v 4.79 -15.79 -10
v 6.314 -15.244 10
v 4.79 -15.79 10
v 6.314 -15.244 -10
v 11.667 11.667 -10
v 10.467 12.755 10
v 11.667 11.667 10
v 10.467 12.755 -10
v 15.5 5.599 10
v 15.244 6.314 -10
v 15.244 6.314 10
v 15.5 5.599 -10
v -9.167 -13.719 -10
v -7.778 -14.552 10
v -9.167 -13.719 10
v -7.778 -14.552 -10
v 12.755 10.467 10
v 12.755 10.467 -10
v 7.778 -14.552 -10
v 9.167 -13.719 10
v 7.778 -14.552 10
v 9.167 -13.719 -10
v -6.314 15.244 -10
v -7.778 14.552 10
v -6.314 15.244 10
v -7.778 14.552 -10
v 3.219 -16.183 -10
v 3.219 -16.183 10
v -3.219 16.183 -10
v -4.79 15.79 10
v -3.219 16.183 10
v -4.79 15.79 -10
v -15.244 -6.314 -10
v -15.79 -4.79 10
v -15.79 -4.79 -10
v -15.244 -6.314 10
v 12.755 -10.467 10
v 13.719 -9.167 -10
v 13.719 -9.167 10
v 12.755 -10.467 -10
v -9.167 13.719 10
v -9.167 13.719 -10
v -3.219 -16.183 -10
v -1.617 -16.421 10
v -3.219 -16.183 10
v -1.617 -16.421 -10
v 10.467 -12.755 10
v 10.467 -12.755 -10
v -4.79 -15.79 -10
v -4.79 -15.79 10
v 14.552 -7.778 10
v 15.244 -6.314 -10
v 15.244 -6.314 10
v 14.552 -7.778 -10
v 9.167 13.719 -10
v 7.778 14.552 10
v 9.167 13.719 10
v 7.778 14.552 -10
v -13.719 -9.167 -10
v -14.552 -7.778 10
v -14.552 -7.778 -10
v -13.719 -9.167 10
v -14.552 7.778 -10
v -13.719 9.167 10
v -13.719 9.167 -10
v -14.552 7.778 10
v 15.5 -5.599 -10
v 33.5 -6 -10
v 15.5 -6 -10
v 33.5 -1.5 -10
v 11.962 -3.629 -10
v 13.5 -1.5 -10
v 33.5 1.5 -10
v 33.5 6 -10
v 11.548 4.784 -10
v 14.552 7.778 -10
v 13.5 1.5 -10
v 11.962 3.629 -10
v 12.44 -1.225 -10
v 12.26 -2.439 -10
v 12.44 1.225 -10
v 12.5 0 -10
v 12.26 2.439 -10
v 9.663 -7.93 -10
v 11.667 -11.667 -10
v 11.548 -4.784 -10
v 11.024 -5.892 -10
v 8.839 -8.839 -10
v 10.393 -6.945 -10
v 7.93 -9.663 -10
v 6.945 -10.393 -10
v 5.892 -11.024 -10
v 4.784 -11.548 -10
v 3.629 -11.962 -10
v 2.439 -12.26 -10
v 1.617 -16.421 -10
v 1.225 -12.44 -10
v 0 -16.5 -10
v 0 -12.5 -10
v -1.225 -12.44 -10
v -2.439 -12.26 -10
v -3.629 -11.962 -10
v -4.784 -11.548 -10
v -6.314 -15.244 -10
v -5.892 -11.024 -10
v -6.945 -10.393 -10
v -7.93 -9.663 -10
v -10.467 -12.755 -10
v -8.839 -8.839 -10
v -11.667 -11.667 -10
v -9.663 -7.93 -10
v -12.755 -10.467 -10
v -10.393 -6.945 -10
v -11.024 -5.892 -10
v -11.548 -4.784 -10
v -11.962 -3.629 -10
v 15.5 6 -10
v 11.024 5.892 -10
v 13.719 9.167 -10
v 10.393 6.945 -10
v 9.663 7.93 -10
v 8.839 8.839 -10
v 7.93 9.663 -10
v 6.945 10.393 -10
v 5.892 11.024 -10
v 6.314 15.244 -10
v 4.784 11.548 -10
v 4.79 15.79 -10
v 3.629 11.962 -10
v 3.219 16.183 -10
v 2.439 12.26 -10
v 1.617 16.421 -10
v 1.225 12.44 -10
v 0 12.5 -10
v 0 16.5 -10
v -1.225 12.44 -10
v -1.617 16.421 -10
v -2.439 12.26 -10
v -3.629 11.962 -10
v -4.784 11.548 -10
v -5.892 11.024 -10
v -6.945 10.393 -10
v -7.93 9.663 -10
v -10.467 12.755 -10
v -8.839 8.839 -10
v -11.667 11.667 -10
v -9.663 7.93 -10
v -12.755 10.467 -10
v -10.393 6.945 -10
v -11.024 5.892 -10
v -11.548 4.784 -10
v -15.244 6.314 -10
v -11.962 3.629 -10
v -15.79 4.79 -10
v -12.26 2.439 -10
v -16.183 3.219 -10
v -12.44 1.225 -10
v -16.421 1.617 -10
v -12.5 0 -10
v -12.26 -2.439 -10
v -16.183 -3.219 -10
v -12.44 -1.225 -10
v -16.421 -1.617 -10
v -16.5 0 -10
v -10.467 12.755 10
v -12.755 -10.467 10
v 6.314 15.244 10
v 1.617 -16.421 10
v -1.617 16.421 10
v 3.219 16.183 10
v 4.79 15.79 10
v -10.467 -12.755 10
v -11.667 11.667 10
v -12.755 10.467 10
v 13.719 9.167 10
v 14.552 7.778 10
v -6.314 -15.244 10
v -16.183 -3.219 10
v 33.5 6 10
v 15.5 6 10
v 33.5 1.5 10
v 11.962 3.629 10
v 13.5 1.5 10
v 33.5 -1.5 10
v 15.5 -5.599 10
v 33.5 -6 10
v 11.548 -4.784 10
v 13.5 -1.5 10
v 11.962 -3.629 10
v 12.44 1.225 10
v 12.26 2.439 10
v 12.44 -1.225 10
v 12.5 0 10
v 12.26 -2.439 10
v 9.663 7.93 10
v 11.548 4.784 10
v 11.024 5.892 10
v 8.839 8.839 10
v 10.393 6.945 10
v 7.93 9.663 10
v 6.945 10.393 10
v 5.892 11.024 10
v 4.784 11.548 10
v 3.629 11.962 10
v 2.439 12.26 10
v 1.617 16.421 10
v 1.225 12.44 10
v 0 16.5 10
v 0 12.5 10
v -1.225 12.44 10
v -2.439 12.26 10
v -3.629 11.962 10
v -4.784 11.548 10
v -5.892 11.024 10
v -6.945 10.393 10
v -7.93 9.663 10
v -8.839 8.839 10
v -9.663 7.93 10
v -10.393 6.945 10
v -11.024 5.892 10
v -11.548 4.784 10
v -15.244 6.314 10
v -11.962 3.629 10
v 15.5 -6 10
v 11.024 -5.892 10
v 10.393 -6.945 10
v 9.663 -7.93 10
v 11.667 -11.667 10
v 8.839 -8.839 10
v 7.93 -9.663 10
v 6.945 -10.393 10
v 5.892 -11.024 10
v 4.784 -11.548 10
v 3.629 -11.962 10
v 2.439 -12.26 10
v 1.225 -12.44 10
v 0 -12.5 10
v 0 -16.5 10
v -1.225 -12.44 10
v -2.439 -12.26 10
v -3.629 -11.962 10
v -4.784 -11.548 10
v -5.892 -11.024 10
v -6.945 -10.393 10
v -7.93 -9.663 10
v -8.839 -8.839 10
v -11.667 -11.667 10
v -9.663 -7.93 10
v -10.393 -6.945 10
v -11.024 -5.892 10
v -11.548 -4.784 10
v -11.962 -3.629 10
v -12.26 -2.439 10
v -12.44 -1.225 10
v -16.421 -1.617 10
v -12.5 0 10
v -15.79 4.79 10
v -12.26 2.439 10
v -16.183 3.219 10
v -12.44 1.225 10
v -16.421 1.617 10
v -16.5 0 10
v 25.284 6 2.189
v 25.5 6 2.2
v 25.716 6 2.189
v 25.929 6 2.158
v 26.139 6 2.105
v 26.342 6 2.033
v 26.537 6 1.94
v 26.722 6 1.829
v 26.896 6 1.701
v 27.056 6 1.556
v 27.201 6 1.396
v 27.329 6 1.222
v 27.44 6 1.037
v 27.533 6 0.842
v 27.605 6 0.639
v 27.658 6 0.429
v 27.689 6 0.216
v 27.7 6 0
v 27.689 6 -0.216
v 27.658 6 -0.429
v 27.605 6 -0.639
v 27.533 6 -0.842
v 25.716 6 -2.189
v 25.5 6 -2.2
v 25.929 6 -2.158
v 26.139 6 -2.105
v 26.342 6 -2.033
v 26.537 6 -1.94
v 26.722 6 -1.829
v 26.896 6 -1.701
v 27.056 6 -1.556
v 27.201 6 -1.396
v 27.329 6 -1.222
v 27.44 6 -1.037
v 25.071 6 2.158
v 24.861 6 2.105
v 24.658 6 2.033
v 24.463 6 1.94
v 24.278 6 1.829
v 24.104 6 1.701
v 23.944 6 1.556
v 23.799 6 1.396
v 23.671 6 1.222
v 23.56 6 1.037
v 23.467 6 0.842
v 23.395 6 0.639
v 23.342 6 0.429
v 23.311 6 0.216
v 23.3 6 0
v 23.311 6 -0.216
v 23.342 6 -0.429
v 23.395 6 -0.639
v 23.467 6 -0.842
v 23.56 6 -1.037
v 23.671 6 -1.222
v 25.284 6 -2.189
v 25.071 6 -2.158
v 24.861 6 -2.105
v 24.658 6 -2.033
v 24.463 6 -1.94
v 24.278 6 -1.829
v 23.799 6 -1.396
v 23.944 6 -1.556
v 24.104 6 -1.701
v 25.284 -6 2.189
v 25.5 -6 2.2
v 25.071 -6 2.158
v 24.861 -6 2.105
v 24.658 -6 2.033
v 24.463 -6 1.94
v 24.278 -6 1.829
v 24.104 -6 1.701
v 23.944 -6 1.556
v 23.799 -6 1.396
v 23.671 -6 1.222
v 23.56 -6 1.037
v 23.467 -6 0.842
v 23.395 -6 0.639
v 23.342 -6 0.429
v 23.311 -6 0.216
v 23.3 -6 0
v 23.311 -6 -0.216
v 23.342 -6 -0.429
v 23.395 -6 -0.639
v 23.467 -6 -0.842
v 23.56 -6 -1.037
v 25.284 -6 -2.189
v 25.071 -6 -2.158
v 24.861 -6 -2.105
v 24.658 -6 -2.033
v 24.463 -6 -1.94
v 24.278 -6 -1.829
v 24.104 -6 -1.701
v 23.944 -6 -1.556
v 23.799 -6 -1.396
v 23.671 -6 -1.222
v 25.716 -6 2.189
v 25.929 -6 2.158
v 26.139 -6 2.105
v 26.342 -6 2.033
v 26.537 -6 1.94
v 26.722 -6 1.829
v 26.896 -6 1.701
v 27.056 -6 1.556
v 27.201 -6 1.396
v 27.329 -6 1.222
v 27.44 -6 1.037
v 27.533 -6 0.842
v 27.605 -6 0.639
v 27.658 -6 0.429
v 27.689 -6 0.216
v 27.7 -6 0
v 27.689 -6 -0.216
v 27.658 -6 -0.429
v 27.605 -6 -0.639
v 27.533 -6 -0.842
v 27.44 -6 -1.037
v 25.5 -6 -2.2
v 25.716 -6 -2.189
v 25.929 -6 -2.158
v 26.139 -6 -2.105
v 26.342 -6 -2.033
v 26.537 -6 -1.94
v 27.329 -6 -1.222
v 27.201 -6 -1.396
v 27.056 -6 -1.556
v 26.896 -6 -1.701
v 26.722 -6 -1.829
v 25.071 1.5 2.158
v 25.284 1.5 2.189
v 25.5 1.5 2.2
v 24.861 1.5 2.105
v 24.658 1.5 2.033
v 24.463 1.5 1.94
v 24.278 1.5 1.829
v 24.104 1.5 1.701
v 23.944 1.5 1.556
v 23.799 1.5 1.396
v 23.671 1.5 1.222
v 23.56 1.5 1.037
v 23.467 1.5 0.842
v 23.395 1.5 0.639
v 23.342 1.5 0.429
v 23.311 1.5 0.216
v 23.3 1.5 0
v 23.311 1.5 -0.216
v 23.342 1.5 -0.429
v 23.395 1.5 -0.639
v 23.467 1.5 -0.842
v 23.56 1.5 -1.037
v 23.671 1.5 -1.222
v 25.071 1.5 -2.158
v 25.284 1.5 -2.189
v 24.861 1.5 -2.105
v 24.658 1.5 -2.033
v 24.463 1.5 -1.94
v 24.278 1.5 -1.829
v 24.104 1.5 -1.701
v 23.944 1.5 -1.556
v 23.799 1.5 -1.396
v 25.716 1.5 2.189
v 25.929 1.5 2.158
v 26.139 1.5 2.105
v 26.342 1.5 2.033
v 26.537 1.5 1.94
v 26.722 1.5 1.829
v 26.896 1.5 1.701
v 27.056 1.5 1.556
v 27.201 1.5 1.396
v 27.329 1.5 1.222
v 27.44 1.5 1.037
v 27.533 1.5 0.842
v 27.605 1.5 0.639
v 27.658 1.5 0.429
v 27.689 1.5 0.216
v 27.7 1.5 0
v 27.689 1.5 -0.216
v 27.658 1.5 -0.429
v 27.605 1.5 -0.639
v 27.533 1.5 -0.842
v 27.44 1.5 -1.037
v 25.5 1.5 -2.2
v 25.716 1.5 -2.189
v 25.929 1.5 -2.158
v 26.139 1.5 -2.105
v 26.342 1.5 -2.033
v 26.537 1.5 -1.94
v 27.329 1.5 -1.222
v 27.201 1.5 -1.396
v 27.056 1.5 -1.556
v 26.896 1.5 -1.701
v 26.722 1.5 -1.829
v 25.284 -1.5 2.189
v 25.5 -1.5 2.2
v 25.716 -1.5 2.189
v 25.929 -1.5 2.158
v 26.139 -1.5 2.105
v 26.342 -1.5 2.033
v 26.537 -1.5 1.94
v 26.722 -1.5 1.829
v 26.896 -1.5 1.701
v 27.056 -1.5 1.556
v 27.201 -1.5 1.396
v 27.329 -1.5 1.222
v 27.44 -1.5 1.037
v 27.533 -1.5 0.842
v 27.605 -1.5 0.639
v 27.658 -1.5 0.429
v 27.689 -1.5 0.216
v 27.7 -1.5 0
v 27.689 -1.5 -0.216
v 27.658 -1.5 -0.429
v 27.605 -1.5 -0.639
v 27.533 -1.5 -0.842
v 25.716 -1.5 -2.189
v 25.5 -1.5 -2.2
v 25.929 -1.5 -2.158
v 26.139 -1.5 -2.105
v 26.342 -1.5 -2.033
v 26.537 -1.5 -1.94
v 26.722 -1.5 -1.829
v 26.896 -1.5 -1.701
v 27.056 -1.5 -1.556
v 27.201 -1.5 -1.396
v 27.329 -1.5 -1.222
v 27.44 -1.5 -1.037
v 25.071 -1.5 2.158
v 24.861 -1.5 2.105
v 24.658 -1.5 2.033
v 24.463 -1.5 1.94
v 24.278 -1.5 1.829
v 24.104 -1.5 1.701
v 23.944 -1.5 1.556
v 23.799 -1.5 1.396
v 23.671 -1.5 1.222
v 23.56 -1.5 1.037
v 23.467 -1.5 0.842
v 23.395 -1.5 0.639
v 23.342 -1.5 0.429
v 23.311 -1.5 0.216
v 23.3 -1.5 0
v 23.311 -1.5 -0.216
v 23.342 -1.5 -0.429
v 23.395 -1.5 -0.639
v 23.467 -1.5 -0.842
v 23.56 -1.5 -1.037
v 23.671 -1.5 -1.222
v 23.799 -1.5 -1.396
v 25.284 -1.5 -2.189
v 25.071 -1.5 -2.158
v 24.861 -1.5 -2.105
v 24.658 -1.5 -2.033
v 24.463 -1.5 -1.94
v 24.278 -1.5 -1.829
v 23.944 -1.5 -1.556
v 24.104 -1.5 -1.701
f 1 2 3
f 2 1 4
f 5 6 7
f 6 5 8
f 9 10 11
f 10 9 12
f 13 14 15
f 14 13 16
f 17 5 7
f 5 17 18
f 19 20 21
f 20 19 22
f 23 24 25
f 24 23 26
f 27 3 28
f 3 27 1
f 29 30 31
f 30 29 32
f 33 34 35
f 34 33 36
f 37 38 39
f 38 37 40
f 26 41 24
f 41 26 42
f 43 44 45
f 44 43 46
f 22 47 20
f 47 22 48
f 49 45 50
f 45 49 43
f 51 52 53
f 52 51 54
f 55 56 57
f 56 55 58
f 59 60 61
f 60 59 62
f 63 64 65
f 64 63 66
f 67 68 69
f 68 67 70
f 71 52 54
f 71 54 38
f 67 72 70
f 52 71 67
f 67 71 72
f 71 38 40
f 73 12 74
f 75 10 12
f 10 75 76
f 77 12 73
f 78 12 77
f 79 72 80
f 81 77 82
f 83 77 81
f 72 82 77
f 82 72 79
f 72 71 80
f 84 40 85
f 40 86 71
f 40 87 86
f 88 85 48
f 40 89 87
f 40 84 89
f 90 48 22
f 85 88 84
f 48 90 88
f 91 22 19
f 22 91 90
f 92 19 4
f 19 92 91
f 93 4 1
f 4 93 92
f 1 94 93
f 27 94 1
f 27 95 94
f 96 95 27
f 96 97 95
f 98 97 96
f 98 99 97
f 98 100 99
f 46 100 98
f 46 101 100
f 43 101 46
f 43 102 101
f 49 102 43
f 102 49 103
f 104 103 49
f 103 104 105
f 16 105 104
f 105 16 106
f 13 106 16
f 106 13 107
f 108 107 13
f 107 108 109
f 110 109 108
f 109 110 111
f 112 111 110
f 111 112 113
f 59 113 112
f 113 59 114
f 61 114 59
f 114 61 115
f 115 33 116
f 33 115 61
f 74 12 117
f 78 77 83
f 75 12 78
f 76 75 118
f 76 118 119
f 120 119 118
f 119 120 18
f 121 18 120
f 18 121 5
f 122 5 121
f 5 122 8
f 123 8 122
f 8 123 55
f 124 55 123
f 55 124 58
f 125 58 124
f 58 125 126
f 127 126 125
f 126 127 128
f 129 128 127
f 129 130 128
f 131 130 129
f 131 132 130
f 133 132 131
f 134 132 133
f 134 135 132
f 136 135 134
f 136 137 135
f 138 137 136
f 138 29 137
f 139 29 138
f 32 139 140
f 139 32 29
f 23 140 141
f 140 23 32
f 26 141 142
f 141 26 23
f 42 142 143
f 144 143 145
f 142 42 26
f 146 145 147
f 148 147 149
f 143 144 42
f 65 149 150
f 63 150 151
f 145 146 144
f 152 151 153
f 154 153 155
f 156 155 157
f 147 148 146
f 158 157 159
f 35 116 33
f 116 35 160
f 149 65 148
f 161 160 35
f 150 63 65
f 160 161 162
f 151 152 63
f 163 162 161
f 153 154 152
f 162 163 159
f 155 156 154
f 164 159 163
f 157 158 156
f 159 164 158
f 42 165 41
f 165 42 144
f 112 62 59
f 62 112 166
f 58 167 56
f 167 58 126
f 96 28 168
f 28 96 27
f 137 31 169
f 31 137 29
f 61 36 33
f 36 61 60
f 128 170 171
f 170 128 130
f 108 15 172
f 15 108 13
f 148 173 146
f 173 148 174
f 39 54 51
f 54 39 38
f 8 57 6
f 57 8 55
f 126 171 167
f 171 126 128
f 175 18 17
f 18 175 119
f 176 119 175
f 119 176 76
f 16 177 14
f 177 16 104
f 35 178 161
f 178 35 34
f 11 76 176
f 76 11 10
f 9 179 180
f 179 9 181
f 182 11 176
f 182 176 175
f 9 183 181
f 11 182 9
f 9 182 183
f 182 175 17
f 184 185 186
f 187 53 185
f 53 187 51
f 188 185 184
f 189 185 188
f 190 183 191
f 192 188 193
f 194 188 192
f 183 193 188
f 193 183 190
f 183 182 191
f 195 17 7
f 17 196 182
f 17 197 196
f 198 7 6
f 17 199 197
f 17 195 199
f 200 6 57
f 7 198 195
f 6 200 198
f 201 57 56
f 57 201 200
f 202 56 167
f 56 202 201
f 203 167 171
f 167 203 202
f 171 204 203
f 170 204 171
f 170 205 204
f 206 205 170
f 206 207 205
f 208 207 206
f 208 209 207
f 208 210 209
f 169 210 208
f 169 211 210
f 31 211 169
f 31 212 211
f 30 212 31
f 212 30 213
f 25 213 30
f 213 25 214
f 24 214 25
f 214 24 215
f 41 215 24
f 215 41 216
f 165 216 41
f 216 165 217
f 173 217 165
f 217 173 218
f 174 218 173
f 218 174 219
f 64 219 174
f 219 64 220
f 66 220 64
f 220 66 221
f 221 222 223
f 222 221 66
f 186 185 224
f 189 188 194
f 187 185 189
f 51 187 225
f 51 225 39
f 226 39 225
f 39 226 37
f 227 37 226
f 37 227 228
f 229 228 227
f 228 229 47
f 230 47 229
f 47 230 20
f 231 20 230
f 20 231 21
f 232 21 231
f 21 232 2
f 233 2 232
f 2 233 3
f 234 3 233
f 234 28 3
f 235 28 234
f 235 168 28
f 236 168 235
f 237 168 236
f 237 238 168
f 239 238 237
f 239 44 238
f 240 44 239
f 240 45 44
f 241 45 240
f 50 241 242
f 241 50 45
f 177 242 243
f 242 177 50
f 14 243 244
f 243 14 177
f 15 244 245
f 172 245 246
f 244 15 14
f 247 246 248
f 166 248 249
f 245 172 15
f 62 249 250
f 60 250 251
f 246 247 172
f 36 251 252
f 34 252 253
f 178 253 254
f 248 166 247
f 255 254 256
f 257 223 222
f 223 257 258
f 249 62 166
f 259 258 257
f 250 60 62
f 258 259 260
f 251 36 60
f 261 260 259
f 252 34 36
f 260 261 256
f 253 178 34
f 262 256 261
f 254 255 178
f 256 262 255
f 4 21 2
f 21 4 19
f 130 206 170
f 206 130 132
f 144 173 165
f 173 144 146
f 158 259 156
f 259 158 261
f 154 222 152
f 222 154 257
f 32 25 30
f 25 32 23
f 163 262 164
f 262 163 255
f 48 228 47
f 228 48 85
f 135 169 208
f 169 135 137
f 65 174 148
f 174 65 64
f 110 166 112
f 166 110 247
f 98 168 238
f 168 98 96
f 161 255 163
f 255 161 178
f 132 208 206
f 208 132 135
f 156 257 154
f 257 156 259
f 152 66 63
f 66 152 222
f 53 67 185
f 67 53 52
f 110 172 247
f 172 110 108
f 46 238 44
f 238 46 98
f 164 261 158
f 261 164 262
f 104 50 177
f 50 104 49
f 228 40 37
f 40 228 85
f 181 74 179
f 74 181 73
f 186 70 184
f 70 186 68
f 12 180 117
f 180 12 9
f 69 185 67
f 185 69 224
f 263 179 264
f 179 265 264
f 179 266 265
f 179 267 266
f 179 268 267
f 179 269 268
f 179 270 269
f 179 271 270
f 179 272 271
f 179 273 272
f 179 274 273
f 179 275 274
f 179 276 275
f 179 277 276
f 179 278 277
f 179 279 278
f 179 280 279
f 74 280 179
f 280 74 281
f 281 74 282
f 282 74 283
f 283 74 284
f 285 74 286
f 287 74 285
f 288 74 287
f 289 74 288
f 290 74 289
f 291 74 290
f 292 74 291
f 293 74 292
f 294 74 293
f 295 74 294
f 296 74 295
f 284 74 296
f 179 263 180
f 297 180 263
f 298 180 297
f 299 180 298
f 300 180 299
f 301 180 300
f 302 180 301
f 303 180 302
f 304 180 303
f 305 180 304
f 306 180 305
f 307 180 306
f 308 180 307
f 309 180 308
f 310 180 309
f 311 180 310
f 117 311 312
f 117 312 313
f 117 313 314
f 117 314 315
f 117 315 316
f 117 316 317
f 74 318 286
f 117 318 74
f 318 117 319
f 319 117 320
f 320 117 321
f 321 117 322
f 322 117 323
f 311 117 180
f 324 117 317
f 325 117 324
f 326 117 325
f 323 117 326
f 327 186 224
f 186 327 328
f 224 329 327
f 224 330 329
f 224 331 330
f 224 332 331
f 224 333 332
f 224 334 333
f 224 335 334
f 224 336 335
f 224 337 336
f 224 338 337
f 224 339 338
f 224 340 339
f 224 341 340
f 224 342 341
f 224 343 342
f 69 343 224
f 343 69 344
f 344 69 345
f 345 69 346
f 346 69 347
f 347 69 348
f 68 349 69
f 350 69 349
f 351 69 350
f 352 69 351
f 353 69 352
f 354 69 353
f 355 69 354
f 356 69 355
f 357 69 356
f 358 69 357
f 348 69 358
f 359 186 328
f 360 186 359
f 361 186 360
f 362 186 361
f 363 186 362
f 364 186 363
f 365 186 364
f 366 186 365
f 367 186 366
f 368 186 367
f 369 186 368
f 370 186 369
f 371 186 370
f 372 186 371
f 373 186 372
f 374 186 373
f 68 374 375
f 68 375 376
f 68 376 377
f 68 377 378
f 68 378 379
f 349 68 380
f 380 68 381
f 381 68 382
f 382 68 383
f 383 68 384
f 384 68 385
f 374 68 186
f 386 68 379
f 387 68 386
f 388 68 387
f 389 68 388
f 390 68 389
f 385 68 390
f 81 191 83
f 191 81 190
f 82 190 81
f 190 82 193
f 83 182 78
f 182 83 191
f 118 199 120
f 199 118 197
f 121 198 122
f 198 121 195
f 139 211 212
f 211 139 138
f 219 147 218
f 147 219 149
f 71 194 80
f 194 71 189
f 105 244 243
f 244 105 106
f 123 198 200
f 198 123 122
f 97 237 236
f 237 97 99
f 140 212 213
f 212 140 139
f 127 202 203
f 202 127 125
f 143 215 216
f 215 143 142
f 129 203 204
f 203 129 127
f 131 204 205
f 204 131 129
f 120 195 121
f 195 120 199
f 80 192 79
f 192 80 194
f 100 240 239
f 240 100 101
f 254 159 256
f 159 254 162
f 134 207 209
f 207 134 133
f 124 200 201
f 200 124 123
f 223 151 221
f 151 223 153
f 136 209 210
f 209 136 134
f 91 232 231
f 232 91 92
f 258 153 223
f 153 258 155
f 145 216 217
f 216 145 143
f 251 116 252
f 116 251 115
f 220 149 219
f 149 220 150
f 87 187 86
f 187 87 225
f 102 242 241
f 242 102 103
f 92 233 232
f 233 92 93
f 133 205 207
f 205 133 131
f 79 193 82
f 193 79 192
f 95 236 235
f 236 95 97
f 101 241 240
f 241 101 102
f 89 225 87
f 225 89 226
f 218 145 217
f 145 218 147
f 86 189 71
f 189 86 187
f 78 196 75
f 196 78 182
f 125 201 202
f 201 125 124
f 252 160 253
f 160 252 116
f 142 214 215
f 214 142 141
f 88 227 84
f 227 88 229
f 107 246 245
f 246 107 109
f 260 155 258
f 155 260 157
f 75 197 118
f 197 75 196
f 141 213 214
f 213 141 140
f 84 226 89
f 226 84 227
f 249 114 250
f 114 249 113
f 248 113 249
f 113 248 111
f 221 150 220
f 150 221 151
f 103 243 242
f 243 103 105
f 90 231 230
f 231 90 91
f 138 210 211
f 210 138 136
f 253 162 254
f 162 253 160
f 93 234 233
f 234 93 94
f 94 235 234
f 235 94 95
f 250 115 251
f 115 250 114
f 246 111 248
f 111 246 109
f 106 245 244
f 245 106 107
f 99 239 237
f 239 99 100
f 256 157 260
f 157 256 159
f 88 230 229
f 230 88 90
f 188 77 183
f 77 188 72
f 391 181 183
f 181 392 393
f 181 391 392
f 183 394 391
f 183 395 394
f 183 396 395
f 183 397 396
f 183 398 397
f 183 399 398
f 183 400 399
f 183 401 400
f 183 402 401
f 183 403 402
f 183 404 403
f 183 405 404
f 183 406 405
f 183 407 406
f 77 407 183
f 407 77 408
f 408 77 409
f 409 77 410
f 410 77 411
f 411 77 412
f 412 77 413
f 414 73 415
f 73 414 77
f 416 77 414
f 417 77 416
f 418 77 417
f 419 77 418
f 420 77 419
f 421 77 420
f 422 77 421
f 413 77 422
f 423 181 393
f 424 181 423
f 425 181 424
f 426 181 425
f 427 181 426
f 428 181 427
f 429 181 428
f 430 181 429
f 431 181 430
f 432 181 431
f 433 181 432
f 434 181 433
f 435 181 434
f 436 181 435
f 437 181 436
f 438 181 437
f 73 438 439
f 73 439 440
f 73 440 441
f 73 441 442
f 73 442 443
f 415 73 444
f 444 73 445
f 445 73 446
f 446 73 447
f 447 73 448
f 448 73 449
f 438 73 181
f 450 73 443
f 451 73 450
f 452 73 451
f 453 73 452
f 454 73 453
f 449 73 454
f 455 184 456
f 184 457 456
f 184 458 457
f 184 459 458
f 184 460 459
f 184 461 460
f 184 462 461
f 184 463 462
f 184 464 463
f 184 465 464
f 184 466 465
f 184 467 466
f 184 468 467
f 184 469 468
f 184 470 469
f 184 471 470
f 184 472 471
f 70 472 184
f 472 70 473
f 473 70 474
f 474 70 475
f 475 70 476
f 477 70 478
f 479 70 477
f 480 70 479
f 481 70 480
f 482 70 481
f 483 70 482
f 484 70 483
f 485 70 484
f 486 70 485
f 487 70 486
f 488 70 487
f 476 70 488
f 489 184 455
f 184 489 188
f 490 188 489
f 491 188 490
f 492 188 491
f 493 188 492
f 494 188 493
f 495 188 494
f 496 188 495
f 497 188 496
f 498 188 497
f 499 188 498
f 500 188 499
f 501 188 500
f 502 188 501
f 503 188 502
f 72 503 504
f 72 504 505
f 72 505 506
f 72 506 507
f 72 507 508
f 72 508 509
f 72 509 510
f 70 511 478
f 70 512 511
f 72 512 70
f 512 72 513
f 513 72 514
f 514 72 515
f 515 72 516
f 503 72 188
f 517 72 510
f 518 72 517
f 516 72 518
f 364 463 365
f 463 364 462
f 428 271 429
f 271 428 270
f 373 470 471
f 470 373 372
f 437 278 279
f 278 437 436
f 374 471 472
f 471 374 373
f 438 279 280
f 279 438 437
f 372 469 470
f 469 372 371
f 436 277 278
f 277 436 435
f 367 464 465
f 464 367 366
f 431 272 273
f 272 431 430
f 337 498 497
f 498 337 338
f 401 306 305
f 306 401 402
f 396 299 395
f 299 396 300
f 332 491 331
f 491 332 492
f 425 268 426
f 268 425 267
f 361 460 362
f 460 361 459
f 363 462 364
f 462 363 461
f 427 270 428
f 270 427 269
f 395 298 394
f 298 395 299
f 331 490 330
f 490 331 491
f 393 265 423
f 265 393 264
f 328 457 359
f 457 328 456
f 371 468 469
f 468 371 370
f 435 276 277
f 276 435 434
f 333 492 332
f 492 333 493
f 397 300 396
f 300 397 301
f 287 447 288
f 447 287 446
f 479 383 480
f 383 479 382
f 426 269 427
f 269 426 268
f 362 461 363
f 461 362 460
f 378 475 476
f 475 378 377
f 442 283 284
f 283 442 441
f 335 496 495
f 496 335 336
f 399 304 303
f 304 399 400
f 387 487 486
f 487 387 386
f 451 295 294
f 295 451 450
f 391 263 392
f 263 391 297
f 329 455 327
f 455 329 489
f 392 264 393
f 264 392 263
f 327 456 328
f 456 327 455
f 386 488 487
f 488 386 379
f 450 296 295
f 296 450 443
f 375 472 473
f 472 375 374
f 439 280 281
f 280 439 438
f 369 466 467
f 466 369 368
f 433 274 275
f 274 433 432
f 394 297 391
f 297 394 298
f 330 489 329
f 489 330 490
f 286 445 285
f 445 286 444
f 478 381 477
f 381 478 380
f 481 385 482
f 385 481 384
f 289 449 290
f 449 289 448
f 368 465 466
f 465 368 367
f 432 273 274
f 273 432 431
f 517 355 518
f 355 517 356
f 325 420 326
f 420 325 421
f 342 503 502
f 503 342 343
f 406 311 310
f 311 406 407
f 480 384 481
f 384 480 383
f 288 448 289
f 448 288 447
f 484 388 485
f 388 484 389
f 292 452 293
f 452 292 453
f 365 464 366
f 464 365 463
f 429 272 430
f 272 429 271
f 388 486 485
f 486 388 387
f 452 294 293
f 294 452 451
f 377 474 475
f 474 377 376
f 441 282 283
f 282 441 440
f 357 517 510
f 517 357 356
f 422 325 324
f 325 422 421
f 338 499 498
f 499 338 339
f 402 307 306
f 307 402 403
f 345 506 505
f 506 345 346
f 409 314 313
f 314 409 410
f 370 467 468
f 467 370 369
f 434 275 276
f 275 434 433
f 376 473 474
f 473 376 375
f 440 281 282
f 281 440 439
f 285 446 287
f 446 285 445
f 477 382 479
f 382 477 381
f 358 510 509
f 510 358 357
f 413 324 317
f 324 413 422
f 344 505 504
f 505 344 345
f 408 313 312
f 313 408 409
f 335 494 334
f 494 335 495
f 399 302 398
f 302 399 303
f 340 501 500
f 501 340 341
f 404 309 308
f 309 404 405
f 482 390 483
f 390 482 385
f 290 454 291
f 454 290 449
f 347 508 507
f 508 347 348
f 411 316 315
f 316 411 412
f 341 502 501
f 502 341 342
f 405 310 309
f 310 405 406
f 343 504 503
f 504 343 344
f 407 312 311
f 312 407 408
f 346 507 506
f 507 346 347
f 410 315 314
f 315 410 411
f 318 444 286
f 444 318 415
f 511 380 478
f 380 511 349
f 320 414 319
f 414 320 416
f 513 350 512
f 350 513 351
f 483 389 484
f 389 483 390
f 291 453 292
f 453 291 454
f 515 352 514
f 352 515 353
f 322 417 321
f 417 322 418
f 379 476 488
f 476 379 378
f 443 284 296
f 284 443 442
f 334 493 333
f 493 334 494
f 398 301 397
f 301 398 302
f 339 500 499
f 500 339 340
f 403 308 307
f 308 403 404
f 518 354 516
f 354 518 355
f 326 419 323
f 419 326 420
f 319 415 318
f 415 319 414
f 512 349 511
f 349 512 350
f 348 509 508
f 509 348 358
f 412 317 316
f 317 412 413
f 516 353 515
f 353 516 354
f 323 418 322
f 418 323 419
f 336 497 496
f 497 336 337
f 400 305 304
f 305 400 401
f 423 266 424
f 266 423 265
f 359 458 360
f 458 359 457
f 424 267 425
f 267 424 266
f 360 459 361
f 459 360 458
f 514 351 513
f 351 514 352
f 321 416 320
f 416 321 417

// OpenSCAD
// Generated by NeuroSCAD; edit parameters, not generated geometry.
$fn = 64;

/* [Dimensions] */
// Диаметр трубы (mm)
tube_d = 25; // [8:0.5:80]
// Толщина стенки (mm)
wall = 4; // [2:0.5:12]
// Ширина хомута (mm)
clamp_width = 20; // [8:1:50]
// Зазор разреза (mm)
split_gap = 3; // [1:0.5:10]
// Отверстие под винт (mm)
screw_d = 4.4; // [2:0.1:12]
// Длина проушины (mm)
lug_length = 18; // [10:1:40]
// Высота проушины (mm)
lug_height = 12; // [8:1:30]

/* [Hidden] */
epsilon = 0.05;

difference() {
  union() {
    cylinder(d=(tube_d + (2 * wall)), h=clamp_width, center=true);
    translate([(((tube_d + (2 * wall)) / 2) + (lug_length / 2) + -1), 0, 0]) {
      cube(size=[lug_length, lug_height, clamp_width], center=true);
    }
  }
  cylinder(d=tube_d, h=(clamp_width + 2), center=true);
  translate([(((tube_d + (2 * wall)) / 2) + (lug_length / 2)), 0, 0]) {
    cube(size=[(wall + lug_length + 2), split_gap, (clamp_width + 2)], center=true);
  }
  translate([(((tube_d + (2 * wall)) / 2) + (lug_length / 2)), 0, 0]) {
    rotate([90, 0, 0]) {
      cylinder(d=screw_d, h=(lug_height + 2), center=true);
    }
  }
}
